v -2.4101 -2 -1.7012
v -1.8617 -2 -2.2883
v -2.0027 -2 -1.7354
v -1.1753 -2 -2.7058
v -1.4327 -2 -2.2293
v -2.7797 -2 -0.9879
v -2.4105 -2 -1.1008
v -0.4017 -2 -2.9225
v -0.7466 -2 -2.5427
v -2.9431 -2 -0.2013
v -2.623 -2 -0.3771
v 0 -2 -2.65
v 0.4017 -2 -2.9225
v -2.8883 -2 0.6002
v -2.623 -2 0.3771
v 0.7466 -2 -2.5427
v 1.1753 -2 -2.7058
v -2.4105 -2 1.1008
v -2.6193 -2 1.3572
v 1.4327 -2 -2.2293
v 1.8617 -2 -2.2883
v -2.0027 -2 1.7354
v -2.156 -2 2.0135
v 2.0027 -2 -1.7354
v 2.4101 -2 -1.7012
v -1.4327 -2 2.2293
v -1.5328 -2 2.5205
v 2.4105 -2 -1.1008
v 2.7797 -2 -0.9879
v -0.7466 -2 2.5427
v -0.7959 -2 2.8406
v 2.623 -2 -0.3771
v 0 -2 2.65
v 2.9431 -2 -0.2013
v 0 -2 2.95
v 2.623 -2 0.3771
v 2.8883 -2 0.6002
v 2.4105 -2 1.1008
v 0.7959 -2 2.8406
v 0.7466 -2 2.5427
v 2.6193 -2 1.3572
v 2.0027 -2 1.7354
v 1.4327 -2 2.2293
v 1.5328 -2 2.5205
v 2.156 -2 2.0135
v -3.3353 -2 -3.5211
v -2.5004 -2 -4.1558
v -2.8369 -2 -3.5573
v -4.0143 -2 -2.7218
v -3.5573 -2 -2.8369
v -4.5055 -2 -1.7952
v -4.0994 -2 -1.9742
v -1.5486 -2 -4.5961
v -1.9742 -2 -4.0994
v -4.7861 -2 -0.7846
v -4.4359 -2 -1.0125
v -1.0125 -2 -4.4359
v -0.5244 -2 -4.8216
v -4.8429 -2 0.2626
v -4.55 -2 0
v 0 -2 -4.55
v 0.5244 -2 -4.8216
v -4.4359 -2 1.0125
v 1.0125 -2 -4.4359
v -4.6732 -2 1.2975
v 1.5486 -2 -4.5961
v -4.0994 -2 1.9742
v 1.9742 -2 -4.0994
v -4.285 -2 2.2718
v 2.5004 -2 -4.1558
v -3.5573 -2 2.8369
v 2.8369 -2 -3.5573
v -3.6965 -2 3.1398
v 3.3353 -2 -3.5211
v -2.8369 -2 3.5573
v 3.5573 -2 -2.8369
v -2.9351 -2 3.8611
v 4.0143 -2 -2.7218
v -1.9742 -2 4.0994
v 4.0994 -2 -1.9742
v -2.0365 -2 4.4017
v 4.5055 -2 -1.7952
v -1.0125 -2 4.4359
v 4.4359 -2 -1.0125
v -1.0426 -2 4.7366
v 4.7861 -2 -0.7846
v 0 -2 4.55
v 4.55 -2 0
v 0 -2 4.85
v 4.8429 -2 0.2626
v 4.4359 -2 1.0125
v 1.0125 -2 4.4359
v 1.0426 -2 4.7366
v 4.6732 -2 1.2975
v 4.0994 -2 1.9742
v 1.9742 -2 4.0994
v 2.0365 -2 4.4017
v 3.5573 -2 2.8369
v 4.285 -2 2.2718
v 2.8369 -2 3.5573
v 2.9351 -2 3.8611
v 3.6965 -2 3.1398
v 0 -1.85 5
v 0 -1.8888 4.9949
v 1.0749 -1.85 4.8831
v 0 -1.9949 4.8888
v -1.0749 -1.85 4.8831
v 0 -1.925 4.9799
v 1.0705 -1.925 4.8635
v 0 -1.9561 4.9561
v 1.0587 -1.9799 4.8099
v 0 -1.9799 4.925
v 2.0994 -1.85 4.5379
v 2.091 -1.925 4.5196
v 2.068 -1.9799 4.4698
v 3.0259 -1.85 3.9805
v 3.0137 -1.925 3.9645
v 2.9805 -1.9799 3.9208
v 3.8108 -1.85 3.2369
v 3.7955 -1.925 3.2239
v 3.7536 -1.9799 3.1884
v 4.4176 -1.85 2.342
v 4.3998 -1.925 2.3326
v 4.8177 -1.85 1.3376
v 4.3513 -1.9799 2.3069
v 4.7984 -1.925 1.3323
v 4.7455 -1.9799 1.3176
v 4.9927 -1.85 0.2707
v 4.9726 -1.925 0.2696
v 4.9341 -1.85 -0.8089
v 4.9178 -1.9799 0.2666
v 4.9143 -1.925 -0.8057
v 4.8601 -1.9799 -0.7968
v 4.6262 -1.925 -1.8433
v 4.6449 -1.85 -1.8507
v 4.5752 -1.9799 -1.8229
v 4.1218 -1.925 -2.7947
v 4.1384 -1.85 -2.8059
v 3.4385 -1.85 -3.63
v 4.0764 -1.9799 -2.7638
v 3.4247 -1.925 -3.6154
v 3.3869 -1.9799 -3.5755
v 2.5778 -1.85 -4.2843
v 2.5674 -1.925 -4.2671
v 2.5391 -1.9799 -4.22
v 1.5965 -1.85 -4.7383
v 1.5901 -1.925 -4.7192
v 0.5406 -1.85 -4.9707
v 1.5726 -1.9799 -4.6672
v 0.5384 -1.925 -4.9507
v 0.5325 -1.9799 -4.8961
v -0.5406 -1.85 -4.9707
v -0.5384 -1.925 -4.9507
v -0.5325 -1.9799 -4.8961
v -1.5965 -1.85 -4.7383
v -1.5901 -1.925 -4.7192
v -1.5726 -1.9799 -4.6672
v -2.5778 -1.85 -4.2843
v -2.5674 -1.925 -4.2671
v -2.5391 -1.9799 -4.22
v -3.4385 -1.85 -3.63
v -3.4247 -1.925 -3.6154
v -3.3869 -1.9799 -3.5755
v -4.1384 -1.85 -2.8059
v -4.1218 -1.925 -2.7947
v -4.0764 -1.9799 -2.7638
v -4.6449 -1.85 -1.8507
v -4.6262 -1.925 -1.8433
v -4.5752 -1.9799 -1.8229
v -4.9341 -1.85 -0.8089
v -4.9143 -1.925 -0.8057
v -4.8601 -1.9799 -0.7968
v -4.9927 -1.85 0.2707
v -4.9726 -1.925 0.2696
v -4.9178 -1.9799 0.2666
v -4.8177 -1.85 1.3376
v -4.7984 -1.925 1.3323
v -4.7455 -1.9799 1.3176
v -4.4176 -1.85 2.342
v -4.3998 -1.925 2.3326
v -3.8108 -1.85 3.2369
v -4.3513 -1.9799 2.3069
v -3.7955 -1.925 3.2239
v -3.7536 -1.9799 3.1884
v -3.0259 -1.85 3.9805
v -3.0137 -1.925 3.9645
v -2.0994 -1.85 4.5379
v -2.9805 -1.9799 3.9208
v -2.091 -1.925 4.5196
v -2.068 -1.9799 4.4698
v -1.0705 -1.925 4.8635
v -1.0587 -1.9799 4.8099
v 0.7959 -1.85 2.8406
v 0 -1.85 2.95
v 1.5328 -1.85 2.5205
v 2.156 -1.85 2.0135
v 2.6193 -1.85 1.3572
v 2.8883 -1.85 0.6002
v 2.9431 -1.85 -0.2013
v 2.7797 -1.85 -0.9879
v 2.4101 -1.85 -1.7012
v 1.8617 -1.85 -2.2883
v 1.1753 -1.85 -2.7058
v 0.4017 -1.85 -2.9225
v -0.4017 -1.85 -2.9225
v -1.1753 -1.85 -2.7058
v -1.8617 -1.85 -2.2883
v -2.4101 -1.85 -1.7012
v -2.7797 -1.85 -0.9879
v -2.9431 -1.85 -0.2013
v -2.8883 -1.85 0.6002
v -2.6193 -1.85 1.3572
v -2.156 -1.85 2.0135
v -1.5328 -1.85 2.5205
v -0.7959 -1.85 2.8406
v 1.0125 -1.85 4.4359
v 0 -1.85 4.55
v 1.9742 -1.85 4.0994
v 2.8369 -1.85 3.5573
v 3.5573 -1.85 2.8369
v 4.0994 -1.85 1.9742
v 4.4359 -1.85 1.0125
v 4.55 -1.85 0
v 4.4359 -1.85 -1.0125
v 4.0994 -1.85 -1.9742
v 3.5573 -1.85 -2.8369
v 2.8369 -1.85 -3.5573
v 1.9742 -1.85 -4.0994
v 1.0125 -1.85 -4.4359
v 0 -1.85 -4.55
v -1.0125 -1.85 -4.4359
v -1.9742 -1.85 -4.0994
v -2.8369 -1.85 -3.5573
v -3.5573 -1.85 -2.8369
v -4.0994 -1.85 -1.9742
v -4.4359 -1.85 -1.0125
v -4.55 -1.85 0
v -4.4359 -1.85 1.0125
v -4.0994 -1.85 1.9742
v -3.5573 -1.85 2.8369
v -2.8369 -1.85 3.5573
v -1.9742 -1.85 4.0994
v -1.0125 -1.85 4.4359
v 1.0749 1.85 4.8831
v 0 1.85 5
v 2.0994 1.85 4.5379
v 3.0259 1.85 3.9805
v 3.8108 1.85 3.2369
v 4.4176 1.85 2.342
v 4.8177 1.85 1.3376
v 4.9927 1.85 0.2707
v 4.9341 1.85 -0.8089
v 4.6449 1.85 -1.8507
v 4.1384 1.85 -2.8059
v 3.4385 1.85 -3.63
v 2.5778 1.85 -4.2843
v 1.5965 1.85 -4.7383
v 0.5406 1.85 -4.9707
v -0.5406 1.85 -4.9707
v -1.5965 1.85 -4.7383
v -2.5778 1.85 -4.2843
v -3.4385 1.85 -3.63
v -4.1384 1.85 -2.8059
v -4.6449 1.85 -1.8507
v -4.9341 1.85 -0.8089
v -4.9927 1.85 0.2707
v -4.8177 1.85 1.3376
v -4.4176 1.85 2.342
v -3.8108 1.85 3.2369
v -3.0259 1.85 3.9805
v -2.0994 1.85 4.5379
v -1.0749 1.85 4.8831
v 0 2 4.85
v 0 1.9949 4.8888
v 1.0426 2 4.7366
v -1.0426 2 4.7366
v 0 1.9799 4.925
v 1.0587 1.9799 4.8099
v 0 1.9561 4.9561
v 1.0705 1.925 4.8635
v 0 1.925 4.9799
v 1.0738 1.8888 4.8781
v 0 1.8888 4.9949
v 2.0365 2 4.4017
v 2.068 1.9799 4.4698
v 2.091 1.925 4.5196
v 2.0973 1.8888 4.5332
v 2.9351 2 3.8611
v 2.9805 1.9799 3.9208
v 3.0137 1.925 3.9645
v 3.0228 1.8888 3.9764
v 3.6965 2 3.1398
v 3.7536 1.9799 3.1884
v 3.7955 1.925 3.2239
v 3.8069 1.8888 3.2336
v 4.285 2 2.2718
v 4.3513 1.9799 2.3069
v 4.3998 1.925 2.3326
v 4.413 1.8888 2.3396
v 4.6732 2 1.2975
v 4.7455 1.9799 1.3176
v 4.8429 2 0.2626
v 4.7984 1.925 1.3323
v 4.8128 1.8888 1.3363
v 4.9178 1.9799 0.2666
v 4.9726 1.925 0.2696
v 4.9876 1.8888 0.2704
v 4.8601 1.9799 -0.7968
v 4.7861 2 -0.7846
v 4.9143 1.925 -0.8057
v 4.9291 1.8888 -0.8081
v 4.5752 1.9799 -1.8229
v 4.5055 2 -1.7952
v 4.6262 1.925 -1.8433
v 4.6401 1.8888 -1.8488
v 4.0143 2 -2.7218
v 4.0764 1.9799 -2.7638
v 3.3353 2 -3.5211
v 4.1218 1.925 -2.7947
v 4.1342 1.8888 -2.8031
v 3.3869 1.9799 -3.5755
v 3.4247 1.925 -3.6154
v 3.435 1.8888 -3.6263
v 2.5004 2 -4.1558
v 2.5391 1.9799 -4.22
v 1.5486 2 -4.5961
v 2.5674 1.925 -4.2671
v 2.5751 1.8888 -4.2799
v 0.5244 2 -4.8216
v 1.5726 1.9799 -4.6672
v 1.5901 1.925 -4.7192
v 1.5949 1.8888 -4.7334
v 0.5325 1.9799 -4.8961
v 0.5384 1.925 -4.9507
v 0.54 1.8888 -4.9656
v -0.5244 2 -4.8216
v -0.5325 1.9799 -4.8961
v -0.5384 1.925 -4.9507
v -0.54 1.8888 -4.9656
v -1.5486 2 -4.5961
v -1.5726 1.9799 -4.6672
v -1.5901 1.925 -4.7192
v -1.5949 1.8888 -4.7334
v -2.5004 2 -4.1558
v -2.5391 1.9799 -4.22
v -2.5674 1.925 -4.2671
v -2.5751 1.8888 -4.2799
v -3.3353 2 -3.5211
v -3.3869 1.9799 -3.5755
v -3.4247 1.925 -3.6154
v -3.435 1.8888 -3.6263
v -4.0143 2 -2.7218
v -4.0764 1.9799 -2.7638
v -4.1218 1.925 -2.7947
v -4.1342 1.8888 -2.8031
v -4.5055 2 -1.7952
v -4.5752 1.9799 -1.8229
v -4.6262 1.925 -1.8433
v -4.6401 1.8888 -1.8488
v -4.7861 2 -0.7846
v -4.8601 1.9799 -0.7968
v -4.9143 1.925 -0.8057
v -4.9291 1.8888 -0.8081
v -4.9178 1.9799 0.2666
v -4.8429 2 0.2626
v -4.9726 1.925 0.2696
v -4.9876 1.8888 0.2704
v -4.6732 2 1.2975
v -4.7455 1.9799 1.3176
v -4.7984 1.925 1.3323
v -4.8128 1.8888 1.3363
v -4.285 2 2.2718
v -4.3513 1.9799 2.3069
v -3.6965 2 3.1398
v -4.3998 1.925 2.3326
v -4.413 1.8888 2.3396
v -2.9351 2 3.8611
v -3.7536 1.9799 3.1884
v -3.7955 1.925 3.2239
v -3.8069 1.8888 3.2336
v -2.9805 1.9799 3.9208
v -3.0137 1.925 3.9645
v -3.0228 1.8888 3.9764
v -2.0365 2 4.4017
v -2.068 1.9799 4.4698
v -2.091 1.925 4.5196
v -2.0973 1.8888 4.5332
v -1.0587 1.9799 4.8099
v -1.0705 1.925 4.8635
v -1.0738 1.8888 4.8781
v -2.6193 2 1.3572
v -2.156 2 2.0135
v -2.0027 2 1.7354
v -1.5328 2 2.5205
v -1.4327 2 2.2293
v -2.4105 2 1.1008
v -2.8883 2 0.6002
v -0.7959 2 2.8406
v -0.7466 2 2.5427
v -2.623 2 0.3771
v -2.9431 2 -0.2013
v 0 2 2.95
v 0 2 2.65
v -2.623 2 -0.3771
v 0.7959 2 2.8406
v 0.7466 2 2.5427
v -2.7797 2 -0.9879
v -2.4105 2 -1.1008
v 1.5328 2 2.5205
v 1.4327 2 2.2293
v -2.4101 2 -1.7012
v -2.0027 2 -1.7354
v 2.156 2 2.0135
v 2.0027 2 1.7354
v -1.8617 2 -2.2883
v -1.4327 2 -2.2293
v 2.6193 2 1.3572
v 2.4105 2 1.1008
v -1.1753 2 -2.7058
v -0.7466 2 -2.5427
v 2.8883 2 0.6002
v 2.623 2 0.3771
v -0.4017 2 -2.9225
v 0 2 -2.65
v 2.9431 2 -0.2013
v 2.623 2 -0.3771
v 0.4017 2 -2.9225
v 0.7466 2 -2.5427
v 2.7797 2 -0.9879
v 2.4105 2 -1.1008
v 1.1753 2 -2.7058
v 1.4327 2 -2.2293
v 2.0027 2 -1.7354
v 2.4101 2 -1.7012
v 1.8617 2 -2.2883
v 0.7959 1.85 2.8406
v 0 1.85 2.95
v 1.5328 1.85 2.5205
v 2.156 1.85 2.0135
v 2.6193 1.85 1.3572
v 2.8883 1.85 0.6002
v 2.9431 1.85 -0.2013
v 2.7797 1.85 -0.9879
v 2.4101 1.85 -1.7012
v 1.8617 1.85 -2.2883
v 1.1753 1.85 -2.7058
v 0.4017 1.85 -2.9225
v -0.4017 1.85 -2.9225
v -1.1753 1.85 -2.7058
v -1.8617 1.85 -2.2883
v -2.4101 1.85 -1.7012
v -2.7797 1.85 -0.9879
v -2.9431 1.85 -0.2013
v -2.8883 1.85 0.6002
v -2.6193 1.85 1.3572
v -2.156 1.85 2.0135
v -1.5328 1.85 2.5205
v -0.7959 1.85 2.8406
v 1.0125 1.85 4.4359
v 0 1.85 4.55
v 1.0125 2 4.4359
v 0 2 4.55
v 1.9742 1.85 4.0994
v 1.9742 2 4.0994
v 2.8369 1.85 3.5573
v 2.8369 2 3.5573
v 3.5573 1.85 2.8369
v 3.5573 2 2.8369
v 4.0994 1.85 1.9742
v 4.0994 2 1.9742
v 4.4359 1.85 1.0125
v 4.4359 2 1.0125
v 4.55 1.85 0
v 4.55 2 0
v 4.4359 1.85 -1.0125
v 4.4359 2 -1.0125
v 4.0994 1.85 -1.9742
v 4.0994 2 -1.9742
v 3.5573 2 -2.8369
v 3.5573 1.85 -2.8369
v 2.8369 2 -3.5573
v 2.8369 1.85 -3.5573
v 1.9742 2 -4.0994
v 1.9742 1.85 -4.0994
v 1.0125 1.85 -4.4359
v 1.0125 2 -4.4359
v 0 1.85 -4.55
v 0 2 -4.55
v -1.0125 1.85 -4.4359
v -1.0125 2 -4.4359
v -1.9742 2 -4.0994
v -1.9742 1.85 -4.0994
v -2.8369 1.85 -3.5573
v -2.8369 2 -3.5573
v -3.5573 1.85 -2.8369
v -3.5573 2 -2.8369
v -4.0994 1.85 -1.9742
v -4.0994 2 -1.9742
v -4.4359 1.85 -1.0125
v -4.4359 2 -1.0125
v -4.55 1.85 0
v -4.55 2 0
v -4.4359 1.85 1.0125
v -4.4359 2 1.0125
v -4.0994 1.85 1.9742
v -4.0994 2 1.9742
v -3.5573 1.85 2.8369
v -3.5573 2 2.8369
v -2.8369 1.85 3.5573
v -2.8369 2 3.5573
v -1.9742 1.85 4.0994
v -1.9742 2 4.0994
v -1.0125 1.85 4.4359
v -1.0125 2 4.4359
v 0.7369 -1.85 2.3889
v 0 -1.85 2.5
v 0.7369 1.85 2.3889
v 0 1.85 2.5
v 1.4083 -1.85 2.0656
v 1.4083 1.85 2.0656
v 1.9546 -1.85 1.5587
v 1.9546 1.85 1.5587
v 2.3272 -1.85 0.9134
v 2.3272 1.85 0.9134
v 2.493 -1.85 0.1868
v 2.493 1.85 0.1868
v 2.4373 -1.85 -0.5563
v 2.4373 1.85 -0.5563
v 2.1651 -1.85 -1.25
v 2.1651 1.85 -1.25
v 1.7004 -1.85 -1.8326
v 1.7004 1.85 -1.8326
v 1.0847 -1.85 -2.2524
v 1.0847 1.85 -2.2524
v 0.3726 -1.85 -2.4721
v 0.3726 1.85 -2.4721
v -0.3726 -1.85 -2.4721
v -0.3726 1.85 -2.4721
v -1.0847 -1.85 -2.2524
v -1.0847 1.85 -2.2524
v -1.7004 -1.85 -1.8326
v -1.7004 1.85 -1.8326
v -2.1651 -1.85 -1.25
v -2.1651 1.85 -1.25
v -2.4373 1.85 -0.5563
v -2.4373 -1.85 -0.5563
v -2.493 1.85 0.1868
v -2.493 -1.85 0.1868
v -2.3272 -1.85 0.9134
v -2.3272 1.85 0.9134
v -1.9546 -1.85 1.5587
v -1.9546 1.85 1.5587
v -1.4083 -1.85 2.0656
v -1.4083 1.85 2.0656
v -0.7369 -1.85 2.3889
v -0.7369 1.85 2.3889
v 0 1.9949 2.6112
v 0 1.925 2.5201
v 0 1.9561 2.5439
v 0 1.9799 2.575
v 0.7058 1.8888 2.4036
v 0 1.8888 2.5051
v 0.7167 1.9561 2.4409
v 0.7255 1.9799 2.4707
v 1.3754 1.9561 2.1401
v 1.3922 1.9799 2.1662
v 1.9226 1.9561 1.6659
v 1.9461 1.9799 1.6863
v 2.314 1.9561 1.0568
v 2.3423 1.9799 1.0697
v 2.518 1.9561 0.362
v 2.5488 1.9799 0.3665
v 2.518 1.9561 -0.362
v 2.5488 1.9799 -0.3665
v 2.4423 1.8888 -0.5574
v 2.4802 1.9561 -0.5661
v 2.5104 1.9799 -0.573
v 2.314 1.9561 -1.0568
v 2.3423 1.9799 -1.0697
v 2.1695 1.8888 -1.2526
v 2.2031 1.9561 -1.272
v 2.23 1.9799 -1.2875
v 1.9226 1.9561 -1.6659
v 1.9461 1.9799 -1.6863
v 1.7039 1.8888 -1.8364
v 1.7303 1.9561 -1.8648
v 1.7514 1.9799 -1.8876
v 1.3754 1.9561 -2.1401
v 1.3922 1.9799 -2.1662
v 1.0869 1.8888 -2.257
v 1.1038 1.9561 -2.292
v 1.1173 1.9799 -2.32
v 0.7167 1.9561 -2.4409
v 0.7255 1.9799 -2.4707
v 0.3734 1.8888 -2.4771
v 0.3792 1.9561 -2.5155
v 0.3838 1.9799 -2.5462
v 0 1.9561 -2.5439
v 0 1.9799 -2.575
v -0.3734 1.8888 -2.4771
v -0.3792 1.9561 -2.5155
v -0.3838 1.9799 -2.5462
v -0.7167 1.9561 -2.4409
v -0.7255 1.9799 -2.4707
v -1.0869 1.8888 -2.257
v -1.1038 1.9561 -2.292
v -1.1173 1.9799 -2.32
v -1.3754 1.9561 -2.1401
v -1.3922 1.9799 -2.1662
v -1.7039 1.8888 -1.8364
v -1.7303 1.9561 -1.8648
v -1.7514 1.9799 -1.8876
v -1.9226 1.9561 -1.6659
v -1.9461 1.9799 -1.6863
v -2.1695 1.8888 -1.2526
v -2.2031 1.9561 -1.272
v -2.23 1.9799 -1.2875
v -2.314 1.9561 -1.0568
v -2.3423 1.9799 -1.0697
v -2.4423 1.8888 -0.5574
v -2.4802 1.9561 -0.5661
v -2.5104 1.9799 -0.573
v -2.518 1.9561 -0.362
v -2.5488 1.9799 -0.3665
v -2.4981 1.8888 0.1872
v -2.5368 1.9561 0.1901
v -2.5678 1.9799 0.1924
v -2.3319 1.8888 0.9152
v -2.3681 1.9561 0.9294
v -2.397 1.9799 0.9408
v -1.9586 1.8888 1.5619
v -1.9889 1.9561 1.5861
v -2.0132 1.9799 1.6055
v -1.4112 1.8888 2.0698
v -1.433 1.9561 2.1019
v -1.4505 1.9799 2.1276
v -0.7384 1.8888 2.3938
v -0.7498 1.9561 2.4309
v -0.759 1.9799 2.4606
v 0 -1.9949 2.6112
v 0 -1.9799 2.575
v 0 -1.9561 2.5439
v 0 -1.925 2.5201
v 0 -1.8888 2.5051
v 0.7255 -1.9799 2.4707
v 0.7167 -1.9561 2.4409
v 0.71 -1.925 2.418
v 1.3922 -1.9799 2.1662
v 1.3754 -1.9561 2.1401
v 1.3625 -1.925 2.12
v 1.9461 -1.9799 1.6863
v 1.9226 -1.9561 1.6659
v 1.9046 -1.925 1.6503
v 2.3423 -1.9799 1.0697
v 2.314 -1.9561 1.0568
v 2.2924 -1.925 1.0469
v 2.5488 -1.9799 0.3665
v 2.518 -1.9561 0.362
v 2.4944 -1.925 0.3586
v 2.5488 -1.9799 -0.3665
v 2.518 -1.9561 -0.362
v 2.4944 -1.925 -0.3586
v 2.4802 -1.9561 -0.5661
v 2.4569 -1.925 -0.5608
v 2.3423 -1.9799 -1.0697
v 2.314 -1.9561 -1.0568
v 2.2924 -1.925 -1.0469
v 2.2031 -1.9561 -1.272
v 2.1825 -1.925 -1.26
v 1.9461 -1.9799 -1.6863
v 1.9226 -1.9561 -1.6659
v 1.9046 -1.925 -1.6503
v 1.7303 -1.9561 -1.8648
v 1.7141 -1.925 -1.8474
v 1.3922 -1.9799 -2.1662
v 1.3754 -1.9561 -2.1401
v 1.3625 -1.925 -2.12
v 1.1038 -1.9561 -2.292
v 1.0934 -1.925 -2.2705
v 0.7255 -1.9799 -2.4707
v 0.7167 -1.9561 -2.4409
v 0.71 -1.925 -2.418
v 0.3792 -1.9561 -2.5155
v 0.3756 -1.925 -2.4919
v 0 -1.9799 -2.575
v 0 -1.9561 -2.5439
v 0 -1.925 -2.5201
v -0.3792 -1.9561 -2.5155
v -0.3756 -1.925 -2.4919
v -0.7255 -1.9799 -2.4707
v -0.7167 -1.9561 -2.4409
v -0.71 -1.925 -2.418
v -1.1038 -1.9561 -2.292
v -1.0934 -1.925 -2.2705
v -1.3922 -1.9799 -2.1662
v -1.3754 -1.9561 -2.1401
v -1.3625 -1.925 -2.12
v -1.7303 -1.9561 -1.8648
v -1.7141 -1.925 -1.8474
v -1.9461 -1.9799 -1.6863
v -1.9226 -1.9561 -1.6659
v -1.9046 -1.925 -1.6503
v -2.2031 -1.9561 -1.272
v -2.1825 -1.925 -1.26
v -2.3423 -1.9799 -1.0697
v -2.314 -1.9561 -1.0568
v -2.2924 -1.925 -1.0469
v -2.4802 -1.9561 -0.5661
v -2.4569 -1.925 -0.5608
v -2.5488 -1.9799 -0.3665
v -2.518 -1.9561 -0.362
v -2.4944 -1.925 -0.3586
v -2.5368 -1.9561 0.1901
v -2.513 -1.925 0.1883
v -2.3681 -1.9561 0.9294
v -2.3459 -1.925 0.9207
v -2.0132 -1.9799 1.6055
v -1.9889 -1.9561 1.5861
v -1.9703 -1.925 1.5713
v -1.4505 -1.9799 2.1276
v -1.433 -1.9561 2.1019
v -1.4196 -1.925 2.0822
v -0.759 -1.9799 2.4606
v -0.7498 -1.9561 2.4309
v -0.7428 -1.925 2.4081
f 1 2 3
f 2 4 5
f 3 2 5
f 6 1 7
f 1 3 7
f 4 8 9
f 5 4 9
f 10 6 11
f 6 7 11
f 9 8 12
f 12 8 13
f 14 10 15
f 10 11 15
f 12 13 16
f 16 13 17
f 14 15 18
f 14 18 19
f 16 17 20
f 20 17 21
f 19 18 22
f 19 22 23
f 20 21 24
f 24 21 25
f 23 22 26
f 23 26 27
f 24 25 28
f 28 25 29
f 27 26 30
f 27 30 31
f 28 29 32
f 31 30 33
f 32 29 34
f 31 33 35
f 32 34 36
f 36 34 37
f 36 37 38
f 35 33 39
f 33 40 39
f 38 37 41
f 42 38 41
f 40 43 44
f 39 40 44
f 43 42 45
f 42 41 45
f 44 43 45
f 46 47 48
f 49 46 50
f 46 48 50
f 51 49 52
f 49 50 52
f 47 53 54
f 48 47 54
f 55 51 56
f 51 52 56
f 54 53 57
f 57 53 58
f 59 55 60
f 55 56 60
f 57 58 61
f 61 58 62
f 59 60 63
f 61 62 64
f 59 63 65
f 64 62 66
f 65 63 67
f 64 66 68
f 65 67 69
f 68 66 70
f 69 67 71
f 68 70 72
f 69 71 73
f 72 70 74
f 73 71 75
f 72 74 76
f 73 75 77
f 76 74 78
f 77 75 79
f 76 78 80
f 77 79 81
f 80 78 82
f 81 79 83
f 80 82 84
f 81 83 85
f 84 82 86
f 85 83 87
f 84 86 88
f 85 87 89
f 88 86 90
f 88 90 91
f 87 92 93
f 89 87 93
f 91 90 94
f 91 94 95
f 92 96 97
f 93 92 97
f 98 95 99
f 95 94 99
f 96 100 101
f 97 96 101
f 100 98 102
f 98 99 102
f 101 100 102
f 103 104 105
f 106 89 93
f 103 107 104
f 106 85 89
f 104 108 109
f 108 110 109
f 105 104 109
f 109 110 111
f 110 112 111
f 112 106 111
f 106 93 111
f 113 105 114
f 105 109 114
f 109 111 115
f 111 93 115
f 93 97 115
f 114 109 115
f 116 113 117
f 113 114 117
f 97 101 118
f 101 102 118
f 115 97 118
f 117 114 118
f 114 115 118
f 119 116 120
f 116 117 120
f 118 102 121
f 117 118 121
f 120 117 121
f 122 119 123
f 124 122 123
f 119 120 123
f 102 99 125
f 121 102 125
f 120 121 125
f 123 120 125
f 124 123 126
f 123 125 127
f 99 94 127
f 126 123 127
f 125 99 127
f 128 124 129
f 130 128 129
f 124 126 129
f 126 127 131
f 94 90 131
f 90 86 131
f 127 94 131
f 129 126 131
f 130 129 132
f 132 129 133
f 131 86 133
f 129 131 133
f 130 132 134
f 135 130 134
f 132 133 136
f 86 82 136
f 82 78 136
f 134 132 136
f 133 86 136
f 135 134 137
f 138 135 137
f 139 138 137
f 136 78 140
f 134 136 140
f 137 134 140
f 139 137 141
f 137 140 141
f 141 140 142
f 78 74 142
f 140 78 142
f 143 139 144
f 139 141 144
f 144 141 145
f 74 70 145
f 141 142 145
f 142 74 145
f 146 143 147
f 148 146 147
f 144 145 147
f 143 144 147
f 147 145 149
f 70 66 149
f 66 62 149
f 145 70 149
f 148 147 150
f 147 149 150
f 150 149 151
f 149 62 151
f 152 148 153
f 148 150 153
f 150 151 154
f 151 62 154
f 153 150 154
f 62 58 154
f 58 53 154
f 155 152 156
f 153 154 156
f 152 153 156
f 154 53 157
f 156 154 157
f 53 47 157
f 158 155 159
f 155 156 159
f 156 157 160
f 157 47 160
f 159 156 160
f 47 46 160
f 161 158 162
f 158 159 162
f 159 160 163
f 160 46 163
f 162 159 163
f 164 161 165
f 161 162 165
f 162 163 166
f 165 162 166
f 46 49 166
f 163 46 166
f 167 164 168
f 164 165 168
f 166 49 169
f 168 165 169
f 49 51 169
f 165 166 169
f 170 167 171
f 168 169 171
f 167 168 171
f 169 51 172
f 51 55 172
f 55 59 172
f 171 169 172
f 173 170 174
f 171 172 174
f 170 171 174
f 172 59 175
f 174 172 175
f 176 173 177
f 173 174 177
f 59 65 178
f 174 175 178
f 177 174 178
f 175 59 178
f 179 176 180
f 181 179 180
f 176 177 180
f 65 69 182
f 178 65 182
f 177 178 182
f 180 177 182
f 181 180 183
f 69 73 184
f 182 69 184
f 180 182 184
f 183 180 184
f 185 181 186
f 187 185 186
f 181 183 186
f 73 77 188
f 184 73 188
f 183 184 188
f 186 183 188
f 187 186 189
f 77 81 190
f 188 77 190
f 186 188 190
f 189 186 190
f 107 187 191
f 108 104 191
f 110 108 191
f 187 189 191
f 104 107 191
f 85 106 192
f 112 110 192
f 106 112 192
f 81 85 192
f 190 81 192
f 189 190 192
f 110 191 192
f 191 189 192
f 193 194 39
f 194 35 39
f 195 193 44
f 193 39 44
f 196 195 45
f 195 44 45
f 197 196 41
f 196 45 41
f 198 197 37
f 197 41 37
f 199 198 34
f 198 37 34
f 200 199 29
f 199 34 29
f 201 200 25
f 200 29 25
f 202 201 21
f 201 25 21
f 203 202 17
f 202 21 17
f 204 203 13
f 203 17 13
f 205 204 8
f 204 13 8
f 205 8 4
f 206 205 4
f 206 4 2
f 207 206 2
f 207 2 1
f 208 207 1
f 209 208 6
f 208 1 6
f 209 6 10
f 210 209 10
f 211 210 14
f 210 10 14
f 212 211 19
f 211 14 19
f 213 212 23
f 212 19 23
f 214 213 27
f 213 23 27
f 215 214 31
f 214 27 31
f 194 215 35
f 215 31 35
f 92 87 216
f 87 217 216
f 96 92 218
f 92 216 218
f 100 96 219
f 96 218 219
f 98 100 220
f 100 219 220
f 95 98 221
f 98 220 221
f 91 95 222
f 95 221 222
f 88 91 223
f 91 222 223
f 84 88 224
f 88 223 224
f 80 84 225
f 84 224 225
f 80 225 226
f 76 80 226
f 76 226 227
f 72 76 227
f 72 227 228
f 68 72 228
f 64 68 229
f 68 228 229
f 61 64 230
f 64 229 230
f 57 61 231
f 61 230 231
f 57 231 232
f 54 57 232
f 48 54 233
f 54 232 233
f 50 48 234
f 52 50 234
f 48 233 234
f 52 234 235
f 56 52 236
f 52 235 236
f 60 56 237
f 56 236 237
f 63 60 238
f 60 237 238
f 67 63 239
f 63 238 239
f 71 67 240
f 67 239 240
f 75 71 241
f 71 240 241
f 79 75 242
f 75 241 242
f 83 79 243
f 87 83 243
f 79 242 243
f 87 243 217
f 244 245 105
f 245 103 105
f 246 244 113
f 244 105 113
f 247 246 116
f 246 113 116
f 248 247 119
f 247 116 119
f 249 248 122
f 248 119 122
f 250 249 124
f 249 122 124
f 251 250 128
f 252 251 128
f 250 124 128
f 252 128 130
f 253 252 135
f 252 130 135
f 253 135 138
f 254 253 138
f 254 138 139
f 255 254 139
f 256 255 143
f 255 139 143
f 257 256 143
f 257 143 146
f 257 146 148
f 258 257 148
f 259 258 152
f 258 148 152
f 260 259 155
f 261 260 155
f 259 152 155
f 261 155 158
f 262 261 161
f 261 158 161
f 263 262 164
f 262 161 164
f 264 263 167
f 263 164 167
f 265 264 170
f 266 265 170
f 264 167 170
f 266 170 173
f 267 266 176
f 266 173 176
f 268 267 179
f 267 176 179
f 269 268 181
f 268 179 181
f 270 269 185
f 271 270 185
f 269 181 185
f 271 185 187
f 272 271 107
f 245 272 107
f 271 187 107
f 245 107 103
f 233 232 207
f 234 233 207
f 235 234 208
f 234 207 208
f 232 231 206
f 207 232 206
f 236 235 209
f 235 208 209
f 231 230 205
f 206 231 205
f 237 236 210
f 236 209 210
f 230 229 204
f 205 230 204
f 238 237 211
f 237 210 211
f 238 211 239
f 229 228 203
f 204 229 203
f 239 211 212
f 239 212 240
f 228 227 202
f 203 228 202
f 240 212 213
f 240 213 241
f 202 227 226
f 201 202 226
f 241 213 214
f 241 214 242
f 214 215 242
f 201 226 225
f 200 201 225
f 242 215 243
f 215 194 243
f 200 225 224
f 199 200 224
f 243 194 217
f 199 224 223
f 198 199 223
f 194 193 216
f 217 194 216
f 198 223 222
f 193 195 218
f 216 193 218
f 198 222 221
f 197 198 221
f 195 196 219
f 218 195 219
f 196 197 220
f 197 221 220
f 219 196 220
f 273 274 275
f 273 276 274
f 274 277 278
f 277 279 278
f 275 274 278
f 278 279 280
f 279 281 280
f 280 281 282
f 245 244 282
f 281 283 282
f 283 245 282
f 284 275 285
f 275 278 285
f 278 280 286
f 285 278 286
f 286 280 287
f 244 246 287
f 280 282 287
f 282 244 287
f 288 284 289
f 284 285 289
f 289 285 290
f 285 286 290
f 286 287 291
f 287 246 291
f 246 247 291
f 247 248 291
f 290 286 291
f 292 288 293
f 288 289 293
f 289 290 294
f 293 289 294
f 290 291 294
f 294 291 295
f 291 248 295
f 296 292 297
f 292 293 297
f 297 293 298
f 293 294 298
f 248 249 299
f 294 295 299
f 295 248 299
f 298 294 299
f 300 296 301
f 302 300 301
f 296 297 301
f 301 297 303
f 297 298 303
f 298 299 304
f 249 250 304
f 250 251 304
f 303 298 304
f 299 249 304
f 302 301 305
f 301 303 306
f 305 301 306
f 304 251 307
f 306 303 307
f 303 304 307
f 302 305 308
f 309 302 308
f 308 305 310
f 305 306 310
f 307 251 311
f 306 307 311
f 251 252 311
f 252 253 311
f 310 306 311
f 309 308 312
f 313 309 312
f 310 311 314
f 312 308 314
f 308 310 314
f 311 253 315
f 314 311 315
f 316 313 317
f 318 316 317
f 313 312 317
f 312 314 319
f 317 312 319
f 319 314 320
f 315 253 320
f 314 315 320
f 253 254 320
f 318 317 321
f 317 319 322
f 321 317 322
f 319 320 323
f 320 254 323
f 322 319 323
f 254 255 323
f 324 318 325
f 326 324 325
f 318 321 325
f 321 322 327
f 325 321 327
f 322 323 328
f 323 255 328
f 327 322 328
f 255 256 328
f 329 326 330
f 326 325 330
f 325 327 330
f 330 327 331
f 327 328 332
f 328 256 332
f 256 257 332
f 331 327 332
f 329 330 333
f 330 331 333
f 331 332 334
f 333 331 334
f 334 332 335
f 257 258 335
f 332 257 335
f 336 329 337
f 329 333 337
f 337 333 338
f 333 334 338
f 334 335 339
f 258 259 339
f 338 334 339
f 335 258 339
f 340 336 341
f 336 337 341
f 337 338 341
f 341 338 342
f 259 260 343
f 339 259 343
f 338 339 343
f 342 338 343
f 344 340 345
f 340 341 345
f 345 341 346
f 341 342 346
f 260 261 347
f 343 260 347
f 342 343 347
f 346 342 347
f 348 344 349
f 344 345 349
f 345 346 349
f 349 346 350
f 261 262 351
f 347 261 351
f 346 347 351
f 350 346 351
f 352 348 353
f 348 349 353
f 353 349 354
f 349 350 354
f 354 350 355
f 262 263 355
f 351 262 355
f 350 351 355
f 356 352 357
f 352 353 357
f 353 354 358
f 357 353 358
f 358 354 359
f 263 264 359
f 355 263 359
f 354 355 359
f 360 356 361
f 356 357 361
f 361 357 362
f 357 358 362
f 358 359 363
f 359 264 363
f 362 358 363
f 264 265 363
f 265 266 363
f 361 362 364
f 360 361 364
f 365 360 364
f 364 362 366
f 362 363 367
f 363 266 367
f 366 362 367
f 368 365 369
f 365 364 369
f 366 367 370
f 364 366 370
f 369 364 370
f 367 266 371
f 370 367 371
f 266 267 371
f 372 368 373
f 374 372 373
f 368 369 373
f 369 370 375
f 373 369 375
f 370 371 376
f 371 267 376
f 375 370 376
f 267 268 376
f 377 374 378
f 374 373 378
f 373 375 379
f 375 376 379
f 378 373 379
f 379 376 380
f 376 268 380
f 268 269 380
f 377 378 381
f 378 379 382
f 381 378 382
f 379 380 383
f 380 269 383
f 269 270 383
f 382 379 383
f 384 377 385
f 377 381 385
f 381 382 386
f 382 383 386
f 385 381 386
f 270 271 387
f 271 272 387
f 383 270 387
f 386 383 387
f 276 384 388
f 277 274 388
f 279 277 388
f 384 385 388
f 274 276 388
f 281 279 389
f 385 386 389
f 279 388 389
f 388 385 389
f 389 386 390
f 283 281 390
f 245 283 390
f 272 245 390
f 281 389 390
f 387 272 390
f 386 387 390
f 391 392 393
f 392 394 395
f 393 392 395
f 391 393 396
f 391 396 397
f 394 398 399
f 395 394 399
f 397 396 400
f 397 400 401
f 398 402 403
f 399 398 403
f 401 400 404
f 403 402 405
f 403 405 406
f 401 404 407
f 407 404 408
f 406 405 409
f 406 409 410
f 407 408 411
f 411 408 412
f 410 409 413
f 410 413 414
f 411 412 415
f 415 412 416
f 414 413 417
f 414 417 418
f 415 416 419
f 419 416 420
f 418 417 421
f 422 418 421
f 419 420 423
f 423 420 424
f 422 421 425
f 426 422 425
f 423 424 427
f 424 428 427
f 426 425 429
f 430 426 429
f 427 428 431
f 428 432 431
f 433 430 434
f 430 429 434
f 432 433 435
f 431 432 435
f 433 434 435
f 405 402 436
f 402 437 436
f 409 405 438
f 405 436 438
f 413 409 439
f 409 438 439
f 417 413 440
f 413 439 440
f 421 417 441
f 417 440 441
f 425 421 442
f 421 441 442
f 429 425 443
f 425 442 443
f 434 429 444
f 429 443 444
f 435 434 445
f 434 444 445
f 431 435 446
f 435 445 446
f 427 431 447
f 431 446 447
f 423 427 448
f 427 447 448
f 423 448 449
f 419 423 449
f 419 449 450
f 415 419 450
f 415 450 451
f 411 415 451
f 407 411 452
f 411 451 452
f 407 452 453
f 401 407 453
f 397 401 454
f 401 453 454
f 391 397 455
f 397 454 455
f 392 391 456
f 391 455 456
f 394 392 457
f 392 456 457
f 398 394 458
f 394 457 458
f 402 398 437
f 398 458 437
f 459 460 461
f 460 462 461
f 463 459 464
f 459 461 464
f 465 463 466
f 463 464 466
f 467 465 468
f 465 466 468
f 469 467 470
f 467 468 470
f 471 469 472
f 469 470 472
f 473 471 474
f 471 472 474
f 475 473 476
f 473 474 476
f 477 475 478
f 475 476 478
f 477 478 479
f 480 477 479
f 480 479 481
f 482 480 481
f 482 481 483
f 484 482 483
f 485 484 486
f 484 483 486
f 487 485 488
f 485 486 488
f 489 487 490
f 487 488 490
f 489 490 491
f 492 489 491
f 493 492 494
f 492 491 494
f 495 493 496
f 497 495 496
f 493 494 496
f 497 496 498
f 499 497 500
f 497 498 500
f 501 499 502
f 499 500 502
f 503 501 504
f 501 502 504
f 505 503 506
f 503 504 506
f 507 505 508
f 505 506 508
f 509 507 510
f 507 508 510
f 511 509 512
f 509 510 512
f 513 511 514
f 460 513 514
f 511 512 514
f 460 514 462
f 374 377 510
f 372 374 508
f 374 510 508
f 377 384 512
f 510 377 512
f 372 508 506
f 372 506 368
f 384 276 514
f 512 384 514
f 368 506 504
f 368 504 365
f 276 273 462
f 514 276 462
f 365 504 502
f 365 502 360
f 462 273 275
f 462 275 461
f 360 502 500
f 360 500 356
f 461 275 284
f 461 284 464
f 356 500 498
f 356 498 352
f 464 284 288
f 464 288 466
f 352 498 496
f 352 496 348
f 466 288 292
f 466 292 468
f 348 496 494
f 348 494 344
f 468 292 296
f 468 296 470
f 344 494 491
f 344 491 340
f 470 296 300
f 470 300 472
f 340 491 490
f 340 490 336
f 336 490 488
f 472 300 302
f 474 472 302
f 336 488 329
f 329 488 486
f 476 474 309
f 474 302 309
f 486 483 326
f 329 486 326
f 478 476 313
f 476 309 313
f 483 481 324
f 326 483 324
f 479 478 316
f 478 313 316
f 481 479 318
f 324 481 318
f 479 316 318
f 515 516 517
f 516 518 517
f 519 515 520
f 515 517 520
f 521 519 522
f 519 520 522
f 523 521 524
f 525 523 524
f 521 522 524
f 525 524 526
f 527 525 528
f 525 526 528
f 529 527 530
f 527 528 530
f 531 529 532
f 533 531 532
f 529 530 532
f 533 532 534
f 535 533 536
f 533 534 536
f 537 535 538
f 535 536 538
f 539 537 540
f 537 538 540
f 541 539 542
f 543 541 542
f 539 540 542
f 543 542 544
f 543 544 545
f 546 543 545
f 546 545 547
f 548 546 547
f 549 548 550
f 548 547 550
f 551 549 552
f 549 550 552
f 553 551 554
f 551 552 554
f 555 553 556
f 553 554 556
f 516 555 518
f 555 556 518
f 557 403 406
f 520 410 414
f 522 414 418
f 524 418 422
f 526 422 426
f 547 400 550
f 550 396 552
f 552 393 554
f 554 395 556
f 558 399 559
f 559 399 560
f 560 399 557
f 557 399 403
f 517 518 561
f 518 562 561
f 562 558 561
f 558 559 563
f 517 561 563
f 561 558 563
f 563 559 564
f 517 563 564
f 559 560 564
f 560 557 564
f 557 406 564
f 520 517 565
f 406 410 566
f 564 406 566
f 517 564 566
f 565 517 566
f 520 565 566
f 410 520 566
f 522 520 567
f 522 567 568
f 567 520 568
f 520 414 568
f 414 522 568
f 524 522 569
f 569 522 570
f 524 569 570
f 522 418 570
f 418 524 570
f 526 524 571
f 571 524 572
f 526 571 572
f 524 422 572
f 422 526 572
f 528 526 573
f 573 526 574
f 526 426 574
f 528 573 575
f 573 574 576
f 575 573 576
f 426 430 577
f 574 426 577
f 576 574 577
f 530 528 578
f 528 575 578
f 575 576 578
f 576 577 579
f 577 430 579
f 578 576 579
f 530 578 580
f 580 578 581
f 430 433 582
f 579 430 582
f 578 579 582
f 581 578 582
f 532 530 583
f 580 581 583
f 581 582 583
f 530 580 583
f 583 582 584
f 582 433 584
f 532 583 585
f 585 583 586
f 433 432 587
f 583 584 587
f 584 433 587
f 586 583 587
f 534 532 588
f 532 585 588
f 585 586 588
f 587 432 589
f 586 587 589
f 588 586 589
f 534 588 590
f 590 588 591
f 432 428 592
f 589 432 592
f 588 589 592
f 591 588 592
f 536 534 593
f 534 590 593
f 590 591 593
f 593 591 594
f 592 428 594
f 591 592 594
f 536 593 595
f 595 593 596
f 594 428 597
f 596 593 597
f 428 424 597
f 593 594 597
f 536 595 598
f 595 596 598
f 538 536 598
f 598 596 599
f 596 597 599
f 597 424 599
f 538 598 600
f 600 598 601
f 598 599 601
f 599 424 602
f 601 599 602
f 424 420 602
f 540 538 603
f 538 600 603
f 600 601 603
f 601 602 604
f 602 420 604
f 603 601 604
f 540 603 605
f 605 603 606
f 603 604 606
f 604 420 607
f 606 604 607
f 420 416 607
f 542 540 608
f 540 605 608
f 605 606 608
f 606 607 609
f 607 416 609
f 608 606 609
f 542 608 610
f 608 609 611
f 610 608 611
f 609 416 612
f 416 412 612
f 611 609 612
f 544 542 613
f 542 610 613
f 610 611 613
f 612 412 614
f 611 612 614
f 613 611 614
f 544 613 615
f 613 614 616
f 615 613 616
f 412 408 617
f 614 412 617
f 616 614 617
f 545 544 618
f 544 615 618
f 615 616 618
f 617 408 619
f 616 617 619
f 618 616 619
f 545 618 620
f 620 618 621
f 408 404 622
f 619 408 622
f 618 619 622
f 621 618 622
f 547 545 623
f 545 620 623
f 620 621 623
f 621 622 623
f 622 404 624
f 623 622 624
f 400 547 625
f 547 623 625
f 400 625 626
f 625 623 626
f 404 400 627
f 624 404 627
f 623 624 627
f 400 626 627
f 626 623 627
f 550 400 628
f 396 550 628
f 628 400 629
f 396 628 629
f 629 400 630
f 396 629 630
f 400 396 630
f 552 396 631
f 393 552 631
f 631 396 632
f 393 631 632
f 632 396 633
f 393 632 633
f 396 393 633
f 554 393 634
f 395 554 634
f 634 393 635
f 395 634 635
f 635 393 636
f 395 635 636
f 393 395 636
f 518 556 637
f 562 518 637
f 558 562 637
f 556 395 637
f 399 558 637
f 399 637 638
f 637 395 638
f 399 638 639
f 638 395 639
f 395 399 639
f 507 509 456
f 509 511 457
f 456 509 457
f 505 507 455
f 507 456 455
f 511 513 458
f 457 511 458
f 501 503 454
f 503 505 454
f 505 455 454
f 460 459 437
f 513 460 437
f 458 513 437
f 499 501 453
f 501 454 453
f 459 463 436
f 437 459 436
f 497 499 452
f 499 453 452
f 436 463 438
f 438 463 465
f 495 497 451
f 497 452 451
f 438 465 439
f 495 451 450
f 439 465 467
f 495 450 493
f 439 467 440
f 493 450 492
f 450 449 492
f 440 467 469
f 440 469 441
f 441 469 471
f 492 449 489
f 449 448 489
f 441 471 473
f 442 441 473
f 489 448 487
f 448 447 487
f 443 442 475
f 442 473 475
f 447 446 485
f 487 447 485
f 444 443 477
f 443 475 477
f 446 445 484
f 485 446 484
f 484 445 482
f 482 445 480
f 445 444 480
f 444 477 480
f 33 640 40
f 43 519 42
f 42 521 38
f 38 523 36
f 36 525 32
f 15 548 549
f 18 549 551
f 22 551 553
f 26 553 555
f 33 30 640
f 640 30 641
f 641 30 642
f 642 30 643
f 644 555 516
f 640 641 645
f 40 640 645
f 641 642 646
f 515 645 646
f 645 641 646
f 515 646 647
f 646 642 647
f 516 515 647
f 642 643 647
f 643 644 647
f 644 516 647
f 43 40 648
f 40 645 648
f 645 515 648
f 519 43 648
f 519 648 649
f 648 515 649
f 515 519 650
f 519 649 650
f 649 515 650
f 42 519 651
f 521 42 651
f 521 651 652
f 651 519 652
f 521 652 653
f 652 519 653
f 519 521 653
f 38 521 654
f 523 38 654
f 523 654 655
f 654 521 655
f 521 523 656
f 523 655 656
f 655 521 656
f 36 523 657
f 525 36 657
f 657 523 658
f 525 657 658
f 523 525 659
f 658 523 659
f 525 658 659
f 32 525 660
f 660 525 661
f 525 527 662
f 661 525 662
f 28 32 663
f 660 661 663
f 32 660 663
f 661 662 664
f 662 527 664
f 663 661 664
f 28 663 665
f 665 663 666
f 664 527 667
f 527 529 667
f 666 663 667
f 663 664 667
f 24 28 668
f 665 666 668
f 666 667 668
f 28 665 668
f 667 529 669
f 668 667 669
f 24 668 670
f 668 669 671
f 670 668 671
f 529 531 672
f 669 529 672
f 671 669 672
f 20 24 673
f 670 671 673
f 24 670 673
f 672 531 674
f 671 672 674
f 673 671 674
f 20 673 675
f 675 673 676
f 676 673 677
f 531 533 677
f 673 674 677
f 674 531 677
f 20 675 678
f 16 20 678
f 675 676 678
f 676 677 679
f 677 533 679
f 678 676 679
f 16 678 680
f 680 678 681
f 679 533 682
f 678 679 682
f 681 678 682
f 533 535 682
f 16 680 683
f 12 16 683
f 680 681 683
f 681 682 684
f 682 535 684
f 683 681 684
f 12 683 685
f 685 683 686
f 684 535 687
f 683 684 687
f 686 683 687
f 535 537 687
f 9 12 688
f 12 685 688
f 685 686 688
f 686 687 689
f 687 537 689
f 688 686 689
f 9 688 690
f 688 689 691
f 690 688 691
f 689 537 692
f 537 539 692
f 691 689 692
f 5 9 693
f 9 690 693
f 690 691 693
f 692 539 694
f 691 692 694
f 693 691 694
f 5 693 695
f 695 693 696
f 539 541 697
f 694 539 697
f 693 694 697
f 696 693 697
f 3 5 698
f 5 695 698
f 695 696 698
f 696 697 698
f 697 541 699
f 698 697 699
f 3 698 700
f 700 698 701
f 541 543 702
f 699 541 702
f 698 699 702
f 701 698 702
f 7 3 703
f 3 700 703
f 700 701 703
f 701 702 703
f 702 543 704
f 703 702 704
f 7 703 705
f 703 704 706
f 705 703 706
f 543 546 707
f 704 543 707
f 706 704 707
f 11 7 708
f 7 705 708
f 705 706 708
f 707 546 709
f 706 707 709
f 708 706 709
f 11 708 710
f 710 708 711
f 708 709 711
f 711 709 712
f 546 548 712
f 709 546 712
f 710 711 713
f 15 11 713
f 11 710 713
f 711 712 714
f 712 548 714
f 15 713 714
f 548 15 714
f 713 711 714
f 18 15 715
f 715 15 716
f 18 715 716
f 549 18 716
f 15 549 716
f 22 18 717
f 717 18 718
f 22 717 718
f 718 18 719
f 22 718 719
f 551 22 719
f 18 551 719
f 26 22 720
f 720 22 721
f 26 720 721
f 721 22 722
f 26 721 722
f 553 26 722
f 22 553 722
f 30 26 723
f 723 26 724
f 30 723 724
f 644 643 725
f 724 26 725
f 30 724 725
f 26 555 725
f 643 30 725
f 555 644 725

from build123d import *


with BuildPart() as part:
    # Esquisse1 → Révolution1 (revolve)
    with BuildSketch(Plane(origin=(0, 0, 0), x_dir=(-1, 0, 0), z_dir=(0, 0, -1)), mode=Mode.PRIVATE) as r_volution1_sk:
        with BuildLine():
            Line((-2.5, -1.85), (-2.5, 1.85))
            ThreePointArc((-2.5, 1.85), (-2.543933983, 1.956066017), (-2.65, 2))
            Line((-2.65, 2), (-2.95, 2))
            Line((-2.95, 2), (-2.95, 1.85))
            Line((-2.95, 1.85), (-4.55, 1.85))
            Line((-4.55, 1.85), (-4.55, 2))
            Line((-4.55, 2), (-4.85, 2))
            ThreePointArc((-4.85, 2), (-4.956066017, 1.956066017), (-5, 1.85))
            Line((-5, 1.85), (-5, -1.85))
            ThreePointArc((-5, -1.85), (-4.956066017, -1.956066017), (-4.85, -2))
            Line((-4.85, -2), (-4.55, -2))
            Line((-4.55, -2), (-4.55, -1.85))
            Line((-4.55, -1.85), (-2.95, -1.85))
            Line((-2.95, -1.85), (-2.95, -2))
            Line((-2.95, -2), (-2.65, -2))
            ThreePointArc((-2.65, -2), (-2.543933983, -1.956066017), (-2.5, -1.85))
        make_face()
    revolve(r_volution1_sk.sketch.rotate(Axis((0, -2.003446066, 0), (0, 1, 0)), 270), axis=Axis((0, -2.003446066, 0), (0, 1, 0)))


solid = part.part
